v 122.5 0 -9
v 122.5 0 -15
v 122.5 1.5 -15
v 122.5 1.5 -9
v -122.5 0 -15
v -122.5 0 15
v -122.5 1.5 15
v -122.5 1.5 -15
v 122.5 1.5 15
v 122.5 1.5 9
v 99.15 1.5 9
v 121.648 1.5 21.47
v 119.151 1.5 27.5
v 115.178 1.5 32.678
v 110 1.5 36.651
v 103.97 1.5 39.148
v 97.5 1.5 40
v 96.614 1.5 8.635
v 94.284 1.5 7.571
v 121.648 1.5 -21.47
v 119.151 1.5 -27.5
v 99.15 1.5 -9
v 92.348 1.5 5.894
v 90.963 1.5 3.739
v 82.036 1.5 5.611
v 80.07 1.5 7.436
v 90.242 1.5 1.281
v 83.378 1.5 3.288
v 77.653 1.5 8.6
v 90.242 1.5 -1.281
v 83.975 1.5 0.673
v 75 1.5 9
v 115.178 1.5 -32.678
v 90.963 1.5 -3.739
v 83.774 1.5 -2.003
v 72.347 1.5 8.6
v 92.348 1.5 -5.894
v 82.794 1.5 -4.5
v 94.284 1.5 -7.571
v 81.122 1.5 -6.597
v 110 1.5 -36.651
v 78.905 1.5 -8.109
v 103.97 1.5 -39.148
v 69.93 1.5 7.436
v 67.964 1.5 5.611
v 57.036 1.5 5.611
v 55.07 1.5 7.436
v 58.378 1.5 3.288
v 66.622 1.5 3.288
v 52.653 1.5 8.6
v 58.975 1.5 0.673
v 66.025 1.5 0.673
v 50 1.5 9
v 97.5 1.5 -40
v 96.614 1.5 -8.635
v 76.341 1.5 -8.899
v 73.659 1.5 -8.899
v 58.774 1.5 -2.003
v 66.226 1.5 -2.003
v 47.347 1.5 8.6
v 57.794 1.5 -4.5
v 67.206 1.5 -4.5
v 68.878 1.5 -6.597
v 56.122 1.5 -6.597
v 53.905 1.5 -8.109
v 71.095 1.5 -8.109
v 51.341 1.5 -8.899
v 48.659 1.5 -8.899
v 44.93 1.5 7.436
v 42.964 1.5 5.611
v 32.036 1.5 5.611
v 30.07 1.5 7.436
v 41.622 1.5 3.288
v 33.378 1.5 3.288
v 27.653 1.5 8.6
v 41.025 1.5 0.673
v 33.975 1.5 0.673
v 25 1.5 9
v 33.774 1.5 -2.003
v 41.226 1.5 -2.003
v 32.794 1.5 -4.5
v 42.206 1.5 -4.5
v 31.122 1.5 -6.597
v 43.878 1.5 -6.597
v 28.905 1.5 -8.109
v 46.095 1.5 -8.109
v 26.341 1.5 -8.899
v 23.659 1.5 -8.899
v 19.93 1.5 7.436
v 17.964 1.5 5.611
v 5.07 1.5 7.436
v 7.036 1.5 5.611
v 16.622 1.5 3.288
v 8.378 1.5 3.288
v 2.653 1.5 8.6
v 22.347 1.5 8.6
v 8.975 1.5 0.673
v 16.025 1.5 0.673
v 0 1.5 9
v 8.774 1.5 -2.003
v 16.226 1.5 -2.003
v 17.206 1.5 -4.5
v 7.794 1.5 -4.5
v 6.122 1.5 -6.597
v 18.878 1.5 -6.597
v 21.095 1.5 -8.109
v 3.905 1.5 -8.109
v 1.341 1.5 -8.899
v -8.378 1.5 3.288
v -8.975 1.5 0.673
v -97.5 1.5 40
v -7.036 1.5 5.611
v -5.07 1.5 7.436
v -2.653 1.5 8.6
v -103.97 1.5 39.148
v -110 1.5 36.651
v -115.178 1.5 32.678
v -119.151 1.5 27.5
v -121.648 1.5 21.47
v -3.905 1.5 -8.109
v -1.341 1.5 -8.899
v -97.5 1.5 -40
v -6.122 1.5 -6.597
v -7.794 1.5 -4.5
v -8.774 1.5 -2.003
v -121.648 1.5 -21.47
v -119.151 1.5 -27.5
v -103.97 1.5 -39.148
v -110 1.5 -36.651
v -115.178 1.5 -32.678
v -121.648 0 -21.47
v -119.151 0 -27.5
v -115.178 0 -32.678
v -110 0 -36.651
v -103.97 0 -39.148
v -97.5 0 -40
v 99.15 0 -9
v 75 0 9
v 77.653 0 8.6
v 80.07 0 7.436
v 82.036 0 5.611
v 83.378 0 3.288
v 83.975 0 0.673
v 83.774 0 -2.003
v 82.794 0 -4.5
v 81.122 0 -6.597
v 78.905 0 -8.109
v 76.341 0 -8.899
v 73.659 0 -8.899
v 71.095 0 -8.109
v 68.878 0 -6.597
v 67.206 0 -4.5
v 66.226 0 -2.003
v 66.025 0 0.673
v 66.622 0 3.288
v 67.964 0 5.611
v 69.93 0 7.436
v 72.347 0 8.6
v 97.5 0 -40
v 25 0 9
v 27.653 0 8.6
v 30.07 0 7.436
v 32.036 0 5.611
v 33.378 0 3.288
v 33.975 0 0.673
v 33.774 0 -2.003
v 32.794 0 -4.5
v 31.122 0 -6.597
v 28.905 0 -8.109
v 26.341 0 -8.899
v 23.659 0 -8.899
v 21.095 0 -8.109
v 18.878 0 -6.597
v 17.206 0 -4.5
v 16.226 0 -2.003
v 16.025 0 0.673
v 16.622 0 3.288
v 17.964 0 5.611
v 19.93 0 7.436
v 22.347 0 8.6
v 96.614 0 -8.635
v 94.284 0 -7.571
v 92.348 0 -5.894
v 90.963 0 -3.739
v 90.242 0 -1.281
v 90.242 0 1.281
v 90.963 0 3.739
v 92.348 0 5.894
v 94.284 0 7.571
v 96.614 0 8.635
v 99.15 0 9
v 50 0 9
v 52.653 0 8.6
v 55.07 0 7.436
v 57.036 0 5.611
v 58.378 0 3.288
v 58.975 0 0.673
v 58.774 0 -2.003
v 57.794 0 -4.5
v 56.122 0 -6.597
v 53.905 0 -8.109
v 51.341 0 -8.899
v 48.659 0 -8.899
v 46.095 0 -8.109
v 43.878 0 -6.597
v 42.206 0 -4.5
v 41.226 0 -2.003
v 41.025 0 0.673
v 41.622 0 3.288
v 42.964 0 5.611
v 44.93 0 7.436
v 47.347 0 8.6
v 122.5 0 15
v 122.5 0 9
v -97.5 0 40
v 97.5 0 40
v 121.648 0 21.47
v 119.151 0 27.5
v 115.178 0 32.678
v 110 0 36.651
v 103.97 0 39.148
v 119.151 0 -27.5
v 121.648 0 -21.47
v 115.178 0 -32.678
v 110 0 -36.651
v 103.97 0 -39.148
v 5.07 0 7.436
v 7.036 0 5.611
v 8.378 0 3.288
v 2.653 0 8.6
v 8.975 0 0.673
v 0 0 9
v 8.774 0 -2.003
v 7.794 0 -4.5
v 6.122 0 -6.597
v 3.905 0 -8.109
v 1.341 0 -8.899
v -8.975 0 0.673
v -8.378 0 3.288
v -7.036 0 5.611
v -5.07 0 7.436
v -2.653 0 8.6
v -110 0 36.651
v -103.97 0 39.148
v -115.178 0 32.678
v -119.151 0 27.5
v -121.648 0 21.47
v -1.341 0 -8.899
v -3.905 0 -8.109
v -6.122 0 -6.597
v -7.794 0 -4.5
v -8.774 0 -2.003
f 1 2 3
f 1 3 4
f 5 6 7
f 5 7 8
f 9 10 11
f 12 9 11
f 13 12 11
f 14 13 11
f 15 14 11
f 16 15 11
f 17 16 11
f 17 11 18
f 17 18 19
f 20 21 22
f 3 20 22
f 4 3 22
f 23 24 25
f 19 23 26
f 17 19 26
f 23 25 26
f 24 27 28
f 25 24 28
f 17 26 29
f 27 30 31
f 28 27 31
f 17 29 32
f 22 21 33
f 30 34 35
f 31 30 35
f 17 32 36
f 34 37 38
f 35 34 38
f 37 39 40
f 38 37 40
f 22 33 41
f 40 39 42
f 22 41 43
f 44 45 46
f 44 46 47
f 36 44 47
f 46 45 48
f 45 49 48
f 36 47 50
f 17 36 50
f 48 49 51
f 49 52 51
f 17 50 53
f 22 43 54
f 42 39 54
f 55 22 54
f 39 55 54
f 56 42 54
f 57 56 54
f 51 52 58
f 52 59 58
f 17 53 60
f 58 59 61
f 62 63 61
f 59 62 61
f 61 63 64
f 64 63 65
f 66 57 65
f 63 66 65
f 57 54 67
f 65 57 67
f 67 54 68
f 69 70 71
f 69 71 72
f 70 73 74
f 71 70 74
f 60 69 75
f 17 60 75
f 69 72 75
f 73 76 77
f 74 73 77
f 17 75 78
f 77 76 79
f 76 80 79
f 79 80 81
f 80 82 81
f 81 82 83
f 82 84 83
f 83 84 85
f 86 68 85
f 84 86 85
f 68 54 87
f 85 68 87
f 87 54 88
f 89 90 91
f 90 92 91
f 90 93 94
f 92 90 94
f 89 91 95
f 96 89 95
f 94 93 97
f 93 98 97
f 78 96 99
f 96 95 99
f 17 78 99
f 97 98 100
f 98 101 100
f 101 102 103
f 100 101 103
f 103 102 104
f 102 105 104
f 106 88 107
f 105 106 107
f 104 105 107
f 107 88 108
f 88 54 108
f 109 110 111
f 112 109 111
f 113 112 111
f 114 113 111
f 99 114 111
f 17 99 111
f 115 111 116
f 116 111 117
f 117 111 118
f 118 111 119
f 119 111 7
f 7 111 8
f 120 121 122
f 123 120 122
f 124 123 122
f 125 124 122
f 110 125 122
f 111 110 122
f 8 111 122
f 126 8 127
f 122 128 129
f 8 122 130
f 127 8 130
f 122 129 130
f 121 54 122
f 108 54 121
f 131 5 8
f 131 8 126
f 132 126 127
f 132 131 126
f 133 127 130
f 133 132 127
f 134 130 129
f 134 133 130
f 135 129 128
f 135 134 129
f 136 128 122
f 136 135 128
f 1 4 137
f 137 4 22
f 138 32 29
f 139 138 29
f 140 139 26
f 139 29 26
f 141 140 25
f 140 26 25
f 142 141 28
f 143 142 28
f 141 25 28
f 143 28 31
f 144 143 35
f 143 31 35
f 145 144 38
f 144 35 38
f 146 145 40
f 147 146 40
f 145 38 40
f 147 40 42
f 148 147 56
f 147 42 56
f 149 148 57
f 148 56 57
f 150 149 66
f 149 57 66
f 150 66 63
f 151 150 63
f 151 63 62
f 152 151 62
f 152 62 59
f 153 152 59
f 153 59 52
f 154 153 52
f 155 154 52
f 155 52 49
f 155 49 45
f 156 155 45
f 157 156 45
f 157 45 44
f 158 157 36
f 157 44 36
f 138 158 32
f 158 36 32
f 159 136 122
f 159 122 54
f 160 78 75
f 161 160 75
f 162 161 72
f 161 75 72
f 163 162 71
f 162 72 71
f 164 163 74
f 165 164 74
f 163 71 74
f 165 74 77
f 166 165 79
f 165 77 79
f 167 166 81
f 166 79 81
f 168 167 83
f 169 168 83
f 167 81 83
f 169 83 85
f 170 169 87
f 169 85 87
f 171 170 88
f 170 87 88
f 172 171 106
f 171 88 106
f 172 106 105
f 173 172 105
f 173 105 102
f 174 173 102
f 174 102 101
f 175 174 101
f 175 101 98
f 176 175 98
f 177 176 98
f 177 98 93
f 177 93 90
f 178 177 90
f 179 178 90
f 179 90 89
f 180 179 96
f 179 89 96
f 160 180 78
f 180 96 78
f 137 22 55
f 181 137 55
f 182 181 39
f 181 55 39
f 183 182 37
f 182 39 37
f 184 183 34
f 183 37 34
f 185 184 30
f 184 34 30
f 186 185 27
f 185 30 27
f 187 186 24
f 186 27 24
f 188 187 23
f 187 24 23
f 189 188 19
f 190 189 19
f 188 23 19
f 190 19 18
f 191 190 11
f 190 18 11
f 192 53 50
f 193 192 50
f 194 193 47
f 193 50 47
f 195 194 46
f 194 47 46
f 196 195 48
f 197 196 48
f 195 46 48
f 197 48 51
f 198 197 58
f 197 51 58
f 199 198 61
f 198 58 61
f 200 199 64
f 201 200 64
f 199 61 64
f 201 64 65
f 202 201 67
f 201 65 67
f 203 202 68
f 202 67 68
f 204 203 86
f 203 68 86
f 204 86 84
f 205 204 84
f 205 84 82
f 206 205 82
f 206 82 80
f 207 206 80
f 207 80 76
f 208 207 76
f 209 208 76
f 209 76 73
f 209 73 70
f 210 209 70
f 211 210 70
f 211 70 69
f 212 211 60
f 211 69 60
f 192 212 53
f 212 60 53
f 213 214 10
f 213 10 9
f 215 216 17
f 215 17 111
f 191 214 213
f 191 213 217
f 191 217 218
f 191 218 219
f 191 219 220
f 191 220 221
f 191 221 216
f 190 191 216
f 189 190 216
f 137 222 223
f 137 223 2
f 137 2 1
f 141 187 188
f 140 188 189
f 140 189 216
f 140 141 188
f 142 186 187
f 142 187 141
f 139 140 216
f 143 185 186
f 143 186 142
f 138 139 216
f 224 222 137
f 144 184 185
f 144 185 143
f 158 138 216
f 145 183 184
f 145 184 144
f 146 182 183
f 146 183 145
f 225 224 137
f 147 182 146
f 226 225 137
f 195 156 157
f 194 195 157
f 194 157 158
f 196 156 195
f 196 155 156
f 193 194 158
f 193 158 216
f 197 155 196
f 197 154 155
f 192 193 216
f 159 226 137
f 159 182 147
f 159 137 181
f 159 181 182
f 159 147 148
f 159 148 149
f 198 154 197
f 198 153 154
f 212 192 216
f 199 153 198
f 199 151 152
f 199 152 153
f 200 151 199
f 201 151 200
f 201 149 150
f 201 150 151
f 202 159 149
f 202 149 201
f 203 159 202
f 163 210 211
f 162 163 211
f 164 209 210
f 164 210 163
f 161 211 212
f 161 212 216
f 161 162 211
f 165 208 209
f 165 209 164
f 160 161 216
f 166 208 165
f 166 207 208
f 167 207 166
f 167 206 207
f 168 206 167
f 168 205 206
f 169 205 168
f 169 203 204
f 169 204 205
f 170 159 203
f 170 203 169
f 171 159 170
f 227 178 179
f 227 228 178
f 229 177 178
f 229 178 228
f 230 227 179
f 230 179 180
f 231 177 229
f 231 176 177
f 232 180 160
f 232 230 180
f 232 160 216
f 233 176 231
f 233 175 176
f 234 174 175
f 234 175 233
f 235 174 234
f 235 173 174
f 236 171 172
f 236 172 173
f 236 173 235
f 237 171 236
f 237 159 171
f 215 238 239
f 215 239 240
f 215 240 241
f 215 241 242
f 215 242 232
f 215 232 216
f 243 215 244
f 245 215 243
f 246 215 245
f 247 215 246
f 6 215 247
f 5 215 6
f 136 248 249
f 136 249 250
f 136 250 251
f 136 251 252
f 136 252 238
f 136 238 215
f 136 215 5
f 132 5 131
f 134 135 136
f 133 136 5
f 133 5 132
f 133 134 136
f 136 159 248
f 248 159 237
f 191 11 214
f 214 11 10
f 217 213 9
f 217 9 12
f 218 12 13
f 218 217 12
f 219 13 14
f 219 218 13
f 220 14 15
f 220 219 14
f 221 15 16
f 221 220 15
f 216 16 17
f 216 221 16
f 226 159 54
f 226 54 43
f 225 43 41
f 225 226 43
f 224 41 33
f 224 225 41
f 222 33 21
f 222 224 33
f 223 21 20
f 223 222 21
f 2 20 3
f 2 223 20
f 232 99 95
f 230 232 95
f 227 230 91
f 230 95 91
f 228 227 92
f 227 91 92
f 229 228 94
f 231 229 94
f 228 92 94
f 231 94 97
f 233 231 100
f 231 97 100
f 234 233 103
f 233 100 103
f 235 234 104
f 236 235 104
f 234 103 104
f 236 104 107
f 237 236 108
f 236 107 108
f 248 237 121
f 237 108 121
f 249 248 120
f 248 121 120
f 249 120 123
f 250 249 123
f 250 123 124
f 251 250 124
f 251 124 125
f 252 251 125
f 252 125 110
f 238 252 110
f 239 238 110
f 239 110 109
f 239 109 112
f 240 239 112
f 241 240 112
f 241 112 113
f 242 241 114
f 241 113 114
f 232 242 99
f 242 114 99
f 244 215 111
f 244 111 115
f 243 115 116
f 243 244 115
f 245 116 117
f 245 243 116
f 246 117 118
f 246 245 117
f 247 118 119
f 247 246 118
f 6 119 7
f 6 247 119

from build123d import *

# Parameters (mm, degrees)
BOSS_EXTRUDE1_DEPTH = 1.5
SKETCH2_R           = 9
CUT_EXTRUDE3_DEPTH  = 1.5


with BuildPart() as part:
    # Sketch1 → Boss-Extrude1 (new body)
    with BuildSketch(Plane(origin=(0, 0, 0), x_dir=(1, 0, 0), z_dir=(0, 1, 0))):
        with BuildLine():
            Line((-97.5, 40), (97.5, 40))
            ThreePointArc((97.5, 40), (115.17766953, 32.67766953), (122.5, 15))
            Line((122.5, 15), (122.5, -15))
            ThreePointArc((122.5, -15), (115.17766953, -32.67766953), (97.5, -40))
            Line((97.5, -40), (-97.5, -40))
            ThreePointArc((-97.5, -40), (-115.17766953, -32.67766953), (-122.5, -15))
            Line((-122.5, -15), (-122.5, 15))
            ThreePointArc((-122.5, 15), (-115.17766953, 32.67766953), (-97.5, 40))
        make_face()
    extrude(amount=BOSS_EXTRUDE1_DEPTH)

    # Sketch2 → Cut-Extrude3 (cut)
    with BuildSketch(Plane(origin=(0, 1.5, 0), x_dir=(1, 0, 0), z_dir=(0, 1, 0))):
        with Locations(Location((75, 0, 0), (0, 0, 270))):
            Circle(SKETCH2_R)
        with Locations(Location((50, 0, 0), (0, 0, 270))):
            Circle(SKETCH2_R)
        with Locations(Location((25, 0, 0), (0, 0, 270))):
            Circle(SKETCH2_R)
        with Locations(Location((0, 0, 0), (0, 0, 270))):
            Circle(SKETCH2_R)
        with BuildLine():
            Line((99.15, -9), (122.5, -9))
            Line((122.5, -9), (122.5, 9))
            Line((122.5, 9), (99.15, 9))
            ThreePointArc((99.15, 9), (90.15, 0), (99.15, -9))
        make_face()
    extrude(amount=-CUT_EXTRUDE3_DEPTH, mode=Mode.SUBTRACT)


solid = part.part
